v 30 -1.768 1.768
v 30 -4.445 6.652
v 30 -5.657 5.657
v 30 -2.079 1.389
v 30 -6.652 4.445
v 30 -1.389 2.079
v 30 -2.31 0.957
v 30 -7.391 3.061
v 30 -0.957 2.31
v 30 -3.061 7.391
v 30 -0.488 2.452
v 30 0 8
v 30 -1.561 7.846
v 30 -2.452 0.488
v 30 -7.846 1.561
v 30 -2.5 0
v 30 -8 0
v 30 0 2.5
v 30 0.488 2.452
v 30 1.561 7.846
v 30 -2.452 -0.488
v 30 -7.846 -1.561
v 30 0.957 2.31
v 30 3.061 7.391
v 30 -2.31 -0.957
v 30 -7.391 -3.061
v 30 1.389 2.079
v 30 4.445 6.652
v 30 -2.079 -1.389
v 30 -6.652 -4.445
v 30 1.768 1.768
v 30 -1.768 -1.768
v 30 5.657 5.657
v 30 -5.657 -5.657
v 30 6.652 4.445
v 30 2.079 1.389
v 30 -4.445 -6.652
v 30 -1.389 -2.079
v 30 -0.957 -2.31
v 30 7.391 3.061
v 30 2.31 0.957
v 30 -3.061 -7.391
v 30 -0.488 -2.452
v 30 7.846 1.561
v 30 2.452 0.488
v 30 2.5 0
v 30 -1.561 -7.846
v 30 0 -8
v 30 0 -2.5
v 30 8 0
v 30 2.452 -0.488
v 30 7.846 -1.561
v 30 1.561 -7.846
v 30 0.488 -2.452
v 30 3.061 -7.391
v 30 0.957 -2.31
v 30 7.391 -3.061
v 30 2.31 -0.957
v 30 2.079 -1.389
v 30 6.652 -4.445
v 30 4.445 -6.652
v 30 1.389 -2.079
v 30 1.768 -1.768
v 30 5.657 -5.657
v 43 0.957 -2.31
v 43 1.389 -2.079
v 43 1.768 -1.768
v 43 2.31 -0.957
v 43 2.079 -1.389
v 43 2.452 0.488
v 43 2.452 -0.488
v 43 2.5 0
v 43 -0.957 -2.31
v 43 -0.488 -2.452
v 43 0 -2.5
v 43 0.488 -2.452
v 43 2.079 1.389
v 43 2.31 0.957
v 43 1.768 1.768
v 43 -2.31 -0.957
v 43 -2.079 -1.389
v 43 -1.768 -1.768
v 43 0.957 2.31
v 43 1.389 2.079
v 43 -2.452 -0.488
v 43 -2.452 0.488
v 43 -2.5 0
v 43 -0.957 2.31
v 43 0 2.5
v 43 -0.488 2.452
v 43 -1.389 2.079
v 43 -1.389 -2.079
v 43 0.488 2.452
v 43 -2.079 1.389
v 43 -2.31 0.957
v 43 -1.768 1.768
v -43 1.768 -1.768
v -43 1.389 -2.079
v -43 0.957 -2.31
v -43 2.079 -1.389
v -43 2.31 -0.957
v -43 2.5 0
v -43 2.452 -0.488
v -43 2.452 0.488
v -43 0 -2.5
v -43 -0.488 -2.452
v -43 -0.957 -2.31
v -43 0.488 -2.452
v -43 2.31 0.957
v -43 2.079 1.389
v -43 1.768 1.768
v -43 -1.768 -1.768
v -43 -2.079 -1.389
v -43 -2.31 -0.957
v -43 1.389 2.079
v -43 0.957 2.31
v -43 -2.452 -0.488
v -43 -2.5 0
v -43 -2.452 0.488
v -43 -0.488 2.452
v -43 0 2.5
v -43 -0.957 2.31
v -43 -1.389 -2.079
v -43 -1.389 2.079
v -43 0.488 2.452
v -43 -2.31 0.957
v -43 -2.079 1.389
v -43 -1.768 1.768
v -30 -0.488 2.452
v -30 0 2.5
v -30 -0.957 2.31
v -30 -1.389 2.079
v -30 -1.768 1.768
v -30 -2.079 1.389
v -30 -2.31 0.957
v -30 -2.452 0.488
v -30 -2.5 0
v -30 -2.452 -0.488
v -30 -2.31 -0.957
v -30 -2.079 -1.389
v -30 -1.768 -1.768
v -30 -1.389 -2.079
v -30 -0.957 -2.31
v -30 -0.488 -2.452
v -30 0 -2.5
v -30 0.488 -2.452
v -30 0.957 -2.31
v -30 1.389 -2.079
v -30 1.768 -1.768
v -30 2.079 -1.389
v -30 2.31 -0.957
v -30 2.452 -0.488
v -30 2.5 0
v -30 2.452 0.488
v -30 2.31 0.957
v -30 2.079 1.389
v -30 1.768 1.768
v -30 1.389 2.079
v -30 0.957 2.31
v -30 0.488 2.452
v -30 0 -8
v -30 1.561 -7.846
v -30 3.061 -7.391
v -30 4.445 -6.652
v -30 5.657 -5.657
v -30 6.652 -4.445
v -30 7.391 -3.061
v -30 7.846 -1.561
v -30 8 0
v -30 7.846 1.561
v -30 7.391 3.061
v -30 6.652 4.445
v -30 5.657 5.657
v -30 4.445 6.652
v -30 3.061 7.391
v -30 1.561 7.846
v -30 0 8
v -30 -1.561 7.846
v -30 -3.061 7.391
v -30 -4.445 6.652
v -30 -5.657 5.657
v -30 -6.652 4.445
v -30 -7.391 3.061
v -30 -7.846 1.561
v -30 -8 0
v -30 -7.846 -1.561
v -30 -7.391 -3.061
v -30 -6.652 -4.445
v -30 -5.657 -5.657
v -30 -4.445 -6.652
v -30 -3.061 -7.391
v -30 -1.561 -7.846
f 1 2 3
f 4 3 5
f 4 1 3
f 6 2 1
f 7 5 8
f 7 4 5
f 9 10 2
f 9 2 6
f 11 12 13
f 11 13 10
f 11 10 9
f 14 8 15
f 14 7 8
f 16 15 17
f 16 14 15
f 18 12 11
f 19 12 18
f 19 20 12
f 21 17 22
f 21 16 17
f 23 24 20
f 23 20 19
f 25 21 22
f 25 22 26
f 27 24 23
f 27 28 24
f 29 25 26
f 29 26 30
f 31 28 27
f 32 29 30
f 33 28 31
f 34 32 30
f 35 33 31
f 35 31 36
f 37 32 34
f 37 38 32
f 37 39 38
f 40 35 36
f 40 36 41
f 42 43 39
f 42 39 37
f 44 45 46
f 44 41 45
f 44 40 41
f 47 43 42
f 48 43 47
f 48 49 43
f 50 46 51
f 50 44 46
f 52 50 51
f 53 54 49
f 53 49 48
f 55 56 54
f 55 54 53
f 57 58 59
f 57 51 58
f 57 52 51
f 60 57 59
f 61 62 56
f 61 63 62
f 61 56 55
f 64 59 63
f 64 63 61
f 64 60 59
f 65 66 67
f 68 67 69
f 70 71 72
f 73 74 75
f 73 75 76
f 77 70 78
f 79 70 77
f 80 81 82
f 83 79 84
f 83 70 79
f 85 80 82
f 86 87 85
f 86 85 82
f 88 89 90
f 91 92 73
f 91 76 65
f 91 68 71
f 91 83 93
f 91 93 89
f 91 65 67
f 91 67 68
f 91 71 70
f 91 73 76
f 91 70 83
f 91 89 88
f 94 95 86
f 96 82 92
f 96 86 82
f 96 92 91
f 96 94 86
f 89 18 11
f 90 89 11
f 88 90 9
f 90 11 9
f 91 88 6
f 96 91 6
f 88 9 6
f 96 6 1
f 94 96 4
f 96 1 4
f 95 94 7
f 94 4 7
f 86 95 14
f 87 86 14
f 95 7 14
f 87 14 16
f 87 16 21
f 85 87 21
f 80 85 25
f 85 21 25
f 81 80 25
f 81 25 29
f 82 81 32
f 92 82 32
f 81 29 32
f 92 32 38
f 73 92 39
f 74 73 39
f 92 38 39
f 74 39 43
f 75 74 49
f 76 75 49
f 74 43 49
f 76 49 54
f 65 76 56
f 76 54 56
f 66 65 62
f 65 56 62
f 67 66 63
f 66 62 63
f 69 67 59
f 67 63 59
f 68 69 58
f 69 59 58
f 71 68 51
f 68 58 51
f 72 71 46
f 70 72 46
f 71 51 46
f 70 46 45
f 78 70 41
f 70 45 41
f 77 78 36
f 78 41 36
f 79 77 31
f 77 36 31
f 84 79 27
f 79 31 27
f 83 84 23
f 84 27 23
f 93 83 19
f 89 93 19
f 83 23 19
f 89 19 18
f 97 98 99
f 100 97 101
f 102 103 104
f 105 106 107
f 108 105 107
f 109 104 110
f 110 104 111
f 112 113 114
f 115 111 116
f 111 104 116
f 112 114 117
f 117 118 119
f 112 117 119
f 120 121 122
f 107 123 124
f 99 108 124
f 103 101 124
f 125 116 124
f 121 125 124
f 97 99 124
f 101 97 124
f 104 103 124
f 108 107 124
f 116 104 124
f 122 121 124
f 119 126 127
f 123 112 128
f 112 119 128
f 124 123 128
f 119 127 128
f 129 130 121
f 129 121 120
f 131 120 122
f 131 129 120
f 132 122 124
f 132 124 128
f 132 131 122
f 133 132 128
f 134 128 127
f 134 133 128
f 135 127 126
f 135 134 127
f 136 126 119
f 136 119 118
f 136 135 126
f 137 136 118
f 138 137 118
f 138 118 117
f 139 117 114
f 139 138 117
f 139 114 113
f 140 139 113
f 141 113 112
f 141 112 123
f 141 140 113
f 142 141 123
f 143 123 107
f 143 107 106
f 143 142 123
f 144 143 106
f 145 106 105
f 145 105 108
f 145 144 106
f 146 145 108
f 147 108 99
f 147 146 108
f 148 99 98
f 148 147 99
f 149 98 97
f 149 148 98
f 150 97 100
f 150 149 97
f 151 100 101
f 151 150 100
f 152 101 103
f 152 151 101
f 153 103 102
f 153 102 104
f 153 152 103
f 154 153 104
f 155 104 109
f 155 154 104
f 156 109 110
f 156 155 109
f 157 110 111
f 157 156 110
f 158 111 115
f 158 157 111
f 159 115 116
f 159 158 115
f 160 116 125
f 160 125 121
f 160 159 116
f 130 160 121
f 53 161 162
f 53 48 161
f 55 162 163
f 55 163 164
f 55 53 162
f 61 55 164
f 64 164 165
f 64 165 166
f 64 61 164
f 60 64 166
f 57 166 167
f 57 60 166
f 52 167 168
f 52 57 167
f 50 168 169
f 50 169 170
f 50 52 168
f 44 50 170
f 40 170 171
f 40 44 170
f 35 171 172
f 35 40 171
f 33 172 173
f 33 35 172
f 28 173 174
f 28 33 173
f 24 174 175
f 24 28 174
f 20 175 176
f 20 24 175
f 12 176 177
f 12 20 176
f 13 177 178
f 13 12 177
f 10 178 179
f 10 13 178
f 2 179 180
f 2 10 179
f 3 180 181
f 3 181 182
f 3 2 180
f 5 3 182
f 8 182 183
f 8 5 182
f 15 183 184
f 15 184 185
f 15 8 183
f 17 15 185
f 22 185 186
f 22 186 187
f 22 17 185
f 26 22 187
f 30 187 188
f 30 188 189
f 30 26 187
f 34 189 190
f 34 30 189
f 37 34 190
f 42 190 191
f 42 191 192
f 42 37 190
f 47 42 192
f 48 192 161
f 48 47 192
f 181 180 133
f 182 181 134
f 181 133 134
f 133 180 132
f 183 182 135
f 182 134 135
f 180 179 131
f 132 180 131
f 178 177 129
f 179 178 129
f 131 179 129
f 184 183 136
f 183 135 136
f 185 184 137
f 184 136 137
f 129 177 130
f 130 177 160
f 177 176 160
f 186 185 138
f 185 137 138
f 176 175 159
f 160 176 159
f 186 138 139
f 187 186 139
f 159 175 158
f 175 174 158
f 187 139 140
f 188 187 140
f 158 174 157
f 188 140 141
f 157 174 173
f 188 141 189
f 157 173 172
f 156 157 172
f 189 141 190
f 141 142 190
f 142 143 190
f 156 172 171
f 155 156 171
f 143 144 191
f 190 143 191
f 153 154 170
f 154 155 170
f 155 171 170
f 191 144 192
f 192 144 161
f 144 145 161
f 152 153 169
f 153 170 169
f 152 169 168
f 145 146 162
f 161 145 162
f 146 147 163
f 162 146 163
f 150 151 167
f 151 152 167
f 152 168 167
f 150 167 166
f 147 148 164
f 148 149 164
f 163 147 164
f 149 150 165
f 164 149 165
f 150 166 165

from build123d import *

# Parameters (mm, degrees)
SKETCH1_R           = 8
BOSS_EXTRUDE1_DEPTH = 30
SKETCH2_R           = 2.5
BOSS_EXTRUDE2_DEPTH = 13


with BuildPart() as part:
    # Sketch1 → Boss-Extrude1 (new body)
    with BuildSketch(Plane(origin=(0, 0, 0), x_dir=(0, 0, -1), z_dir=(1, 0, 0))):
        Circle(SKETCH1_R)
    boss_extrude1 = extrude(amount=BOSS_EXTRUDE1_DEPTH)

    # Sketch2 → Boss-Extrude2 (add)
    with BuildSketch(Plane(origin=(30, 0, 0), x_dir=(0, 0, -1), z_dir=(1, 0, 0))):
        with Locations(Location((0, 0, 0), (0, 0, 180))):
            Circle(SKETCH2_R)
    boss_extrude2 = extrude(amount=BOSS_EXTRUDE2_DEPTH)

    # Mirror1: Boss-Extrude1, Boss-Extrude2 across plane
    add(boss_extrude1.mirror(Plane(origin=(0, 0, 0), x_dir=(0, 0, 1), z_dir=(1, 0, 0))))
    add(boss_extrude2.mirror(Plane(origin=(0, 0, 0), x_dir=(0, 0, 1), z_dir=(1, 0, 0))))


solid = part.part
